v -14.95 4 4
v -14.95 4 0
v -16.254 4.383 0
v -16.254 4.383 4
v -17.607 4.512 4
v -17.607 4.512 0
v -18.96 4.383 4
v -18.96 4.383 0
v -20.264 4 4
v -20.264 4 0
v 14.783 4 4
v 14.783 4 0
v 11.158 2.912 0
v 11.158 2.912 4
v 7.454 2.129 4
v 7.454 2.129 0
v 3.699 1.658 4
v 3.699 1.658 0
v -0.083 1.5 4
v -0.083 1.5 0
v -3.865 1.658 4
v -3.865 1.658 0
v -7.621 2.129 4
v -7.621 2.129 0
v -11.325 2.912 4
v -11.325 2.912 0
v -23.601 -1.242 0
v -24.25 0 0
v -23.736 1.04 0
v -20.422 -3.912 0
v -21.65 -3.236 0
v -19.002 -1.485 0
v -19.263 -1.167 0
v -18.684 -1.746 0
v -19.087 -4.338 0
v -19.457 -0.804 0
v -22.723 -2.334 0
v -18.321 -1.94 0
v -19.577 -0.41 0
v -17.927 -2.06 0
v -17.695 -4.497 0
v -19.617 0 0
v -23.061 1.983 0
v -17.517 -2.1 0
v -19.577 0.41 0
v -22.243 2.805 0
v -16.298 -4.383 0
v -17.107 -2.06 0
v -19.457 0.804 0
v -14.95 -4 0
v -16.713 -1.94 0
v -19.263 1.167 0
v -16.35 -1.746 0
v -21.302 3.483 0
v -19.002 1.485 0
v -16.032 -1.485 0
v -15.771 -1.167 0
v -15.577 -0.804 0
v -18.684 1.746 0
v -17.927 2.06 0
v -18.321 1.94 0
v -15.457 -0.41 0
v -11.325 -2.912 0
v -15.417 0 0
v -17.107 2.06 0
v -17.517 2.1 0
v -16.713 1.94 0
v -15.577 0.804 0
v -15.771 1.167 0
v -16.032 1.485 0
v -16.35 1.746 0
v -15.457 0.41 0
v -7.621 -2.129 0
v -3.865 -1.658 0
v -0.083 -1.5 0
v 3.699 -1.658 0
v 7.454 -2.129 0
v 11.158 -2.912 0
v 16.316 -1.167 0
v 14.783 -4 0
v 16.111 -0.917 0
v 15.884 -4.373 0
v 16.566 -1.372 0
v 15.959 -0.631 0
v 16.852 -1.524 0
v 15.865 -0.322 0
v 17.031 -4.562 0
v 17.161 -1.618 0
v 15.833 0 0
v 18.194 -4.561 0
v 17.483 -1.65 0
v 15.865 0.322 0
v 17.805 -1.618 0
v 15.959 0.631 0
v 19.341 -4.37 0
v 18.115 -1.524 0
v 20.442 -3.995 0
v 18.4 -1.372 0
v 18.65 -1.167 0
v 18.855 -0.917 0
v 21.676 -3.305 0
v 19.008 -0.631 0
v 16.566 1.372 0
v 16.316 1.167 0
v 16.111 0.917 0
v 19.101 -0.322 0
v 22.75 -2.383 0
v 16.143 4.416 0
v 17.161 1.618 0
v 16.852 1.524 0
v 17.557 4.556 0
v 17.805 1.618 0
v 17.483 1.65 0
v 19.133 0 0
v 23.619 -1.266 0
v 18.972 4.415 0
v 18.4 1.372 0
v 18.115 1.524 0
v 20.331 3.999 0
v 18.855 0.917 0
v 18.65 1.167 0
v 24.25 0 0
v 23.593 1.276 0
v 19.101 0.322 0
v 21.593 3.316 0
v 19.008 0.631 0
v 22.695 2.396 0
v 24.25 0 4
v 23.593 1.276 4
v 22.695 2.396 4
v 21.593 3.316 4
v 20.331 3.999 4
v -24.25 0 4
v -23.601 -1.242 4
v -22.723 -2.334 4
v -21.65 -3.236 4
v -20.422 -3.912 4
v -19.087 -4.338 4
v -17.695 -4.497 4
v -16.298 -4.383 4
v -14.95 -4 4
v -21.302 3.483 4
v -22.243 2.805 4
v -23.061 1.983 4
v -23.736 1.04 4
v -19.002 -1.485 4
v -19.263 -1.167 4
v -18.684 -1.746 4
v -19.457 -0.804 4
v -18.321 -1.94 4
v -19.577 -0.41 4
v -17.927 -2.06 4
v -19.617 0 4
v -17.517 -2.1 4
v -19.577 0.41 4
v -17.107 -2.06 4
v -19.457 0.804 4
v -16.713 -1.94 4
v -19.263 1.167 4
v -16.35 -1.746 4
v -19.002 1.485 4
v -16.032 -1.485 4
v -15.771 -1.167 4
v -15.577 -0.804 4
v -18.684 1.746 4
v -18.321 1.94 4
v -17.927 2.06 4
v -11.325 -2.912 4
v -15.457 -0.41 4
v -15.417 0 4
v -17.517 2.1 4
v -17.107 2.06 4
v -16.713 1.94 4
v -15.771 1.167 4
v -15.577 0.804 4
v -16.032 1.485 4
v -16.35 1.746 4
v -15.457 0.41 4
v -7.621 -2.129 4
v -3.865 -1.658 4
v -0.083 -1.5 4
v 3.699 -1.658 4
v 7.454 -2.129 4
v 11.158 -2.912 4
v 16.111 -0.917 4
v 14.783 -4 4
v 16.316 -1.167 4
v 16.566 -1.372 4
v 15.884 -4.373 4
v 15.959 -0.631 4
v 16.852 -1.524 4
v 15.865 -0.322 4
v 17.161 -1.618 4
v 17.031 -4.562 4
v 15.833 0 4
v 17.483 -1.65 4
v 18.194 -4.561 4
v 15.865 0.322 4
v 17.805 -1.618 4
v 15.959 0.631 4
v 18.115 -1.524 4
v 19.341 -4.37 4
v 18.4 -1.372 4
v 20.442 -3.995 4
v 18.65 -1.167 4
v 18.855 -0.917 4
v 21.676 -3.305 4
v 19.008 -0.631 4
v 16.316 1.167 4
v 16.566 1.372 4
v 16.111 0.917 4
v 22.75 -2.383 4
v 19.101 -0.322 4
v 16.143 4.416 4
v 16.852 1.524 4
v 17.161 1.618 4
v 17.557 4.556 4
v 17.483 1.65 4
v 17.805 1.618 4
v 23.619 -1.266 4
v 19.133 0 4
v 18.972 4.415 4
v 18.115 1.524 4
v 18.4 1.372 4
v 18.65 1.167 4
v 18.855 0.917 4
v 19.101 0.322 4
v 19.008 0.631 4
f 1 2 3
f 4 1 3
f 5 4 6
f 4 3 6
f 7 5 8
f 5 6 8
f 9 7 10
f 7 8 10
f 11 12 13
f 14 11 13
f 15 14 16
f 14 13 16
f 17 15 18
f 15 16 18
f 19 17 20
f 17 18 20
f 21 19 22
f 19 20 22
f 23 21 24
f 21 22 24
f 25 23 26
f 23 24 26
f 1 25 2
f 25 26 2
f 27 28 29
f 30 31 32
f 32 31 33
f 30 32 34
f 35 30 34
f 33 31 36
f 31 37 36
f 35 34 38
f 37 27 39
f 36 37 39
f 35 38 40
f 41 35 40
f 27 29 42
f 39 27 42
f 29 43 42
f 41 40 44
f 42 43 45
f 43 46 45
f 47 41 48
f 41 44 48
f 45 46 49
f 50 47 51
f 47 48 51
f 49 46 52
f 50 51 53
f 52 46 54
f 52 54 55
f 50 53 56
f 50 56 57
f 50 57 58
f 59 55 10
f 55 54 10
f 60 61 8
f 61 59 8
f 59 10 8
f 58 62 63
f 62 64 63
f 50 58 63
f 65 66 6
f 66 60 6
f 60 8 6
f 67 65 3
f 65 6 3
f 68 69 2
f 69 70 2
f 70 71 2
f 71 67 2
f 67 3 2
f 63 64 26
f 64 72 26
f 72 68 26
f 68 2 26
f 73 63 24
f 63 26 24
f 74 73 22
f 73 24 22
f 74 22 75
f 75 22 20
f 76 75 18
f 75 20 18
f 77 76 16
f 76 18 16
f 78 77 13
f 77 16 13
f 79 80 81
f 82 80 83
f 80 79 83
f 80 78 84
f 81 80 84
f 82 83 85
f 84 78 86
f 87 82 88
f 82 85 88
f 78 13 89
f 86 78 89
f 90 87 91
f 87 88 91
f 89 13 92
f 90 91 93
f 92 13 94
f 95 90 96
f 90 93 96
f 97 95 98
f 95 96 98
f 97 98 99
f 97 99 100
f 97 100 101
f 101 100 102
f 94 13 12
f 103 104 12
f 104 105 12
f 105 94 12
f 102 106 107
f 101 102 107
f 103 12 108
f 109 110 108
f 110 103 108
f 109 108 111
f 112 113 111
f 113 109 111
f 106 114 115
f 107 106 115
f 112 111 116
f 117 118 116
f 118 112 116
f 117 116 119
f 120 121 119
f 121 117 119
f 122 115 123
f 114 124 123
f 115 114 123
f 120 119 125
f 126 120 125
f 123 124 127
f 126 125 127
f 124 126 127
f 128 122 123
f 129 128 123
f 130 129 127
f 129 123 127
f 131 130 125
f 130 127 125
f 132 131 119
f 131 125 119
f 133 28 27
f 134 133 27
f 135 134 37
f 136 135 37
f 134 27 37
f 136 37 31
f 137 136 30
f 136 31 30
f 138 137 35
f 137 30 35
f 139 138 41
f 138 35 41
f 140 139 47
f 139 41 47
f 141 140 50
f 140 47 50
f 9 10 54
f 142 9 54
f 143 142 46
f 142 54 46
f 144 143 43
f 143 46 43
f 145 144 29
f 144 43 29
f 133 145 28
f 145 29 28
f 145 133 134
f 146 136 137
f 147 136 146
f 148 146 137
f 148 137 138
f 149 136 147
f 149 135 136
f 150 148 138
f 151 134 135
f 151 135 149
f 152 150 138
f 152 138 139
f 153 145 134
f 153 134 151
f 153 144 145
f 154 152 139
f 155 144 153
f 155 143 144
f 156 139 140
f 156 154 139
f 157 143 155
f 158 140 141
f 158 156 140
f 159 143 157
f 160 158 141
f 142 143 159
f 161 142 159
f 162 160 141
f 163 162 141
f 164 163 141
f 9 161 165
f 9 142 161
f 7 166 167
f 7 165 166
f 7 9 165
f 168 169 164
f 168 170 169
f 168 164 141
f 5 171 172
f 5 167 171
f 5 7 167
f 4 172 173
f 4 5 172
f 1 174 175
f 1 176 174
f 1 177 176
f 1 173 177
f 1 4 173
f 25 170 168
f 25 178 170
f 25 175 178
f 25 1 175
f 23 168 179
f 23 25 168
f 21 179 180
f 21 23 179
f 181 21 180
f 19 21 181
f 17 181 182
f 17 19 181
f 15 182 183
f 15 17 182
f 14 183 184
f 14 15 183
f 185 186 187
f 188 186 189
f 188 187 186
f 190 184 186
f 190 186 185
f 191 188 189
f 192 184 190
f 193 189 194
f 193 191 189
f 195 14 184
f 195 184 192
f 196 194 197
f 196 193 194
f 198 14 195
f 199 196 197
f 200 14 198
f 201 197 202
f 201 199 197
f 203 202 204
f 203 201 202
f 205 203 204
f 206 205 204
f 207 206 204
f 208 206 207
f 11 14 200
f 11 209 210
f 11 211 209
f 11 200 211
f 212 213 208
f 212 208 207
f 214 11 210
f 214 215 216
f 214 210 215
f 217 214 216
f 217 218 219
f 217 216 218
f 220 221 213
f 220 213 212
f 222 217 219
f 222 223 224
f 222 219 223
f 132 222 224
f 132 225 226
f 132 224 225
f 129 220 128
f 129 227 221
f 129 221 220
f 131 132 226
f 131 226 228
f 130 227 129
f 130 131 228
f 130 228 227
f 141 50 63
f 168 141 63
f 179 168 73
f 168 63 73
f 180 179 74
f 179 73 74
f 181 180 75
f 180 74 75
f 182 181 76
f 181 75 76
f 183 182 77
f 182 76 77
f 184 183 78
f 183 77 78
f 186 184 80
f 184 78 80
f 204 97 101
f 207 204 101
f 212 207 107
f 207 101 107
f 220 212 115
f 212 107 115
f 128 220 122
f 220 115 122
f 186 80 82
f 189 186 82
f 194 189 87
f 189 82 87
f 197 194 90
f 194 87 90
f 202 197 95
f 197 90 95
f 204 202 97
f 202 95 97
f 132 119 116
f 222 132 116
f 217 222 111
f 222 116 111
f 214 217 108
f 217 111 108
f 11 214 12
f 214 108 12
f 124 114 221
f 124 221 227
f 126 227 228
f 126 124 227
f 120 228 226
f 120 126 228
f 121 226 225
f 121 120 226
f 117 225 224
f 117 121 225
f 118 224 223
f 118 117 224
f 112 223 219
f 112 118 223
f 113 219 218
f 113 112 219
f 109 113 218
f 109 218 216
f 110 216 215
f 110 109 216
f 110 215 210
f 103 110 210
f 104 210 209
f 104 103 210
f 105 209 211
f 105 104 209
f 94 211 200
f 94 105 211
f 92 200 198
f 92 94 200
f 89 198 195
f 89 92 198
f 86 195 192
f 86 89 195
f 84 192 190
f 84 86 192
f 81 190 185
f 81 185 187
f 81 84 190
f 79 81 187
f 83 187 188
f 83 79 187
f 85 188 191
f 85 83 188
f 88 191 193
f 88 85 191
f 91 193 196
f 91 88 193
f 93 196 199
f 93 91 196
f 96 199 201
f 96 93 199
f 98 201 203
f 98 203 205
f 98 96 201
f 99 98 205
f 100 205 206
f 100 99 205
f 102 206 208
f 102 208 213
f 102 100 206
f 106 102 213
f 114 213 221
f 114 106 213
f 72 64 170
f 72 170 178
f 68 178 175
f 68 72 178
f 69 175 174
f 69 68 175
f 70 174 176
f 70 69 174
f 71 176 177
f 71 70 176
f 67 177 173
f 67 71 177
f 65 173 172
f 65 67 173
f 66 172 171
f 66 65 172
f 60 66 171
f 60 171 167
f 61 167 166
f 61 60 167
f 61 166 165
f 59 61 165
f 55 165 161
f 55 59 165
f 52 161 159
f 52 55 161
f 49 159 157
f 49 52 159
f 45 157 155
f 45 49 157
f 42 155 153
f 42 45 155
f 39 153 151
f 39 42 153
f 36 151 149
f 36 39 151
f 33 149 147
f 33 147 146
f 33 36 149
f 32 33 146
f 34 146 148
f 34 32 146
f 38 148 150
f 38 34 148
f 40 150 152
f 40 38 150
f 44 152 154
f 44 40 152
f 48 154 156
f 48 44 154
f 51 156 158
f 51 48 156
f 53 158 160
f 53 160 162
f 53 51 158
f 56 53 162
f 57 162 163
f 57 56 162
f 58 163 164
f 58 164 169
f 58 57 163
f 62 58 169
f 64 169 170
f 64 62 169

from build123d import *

# Parameters (mm, degrees)
F0_R     = 2.1
F0_R_2   = 1.65
F1_DEPTH = 4


with BuildPart() as f1:
    # F0 (on Top) → F1 (new body)
    with BuildSketch(Plane.XY):
        with BuildLine():
            ThreePointArc((-14.95, -4), (-0.083435, -1.499923), (14.783129, -4))
            ThreePointArc((14.783129, -4), (17.612798, -4.585324), (20.441514, -3.995413))
            ThreePointArc((20.441514, -3.995413), (22.749633, -2.382687), (24.25, 0))
            ThreePointArc((24.25, 0), (22.695398, 2.39643), (20.3309, 3.999182))
            ThreePointArc((20.3309, 3.999182), (17.557097, 4.555734), (14.783129, 4))
            ThreePointArc((14.783129, 4), (-0.083435, 1.499923), (-14.95, 4))
            ThreePointArc((-14.95, 4), (-17.606941, 4.512271), (-20.263877, 3.999976))
            ThreePointArc((-20.263877, 3.999976), (-22.668799, 2.410422), (-24.25, 0))
            ThreePointArc((-24.25, 0), (-20.422404, -3.91209), (-14.95, -4))
        make_face()
        with Locations((-17.516871, 0)):
            Circle(F0_R, mode=Mode.SUBTRACT)
        with Locations((17.483129, 0)):
            Circle(F0_R_2, mode=Mode.SUBTRACT)
    extrude(amount=F1_DEPTH)


solid = f1.part
